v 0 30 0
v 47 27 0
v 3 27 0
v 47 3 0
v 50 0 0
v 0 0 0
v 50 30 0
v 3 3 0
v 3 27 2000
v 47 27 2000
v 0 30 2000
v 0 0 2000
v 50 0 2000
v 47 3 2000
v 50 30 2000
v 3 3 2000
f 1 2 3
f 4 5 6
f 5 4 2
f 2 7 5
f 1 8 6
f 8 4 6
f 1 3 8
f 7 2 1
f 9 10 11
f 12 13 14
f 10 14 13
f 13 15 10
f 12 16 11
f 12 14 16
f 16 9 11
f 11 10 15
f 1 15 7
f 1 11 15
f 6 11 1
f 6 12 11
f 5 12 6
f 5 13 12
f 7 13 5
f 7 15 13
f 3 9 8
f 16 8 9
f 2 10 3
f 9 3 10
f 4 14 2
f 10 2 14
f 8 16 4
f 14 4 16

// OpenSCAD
/*
square pipe
   a
 ###
 # #  b  
 ### 
 material_thickness = c
*/

module simple_profile_SP(a,b,c, length) {
    linear_extrude( height = length ) {
        polygon(
            points = [
                [0,0],
                [a,0],
                [a,b],
                [0,b],
        
                [c,c],
                [a-c,c],
                [a-c,b-c],
                [c,b-c]
            ],
            paths = [
                [0,1,2,3],
                [4,5,6,7]
            ]
        );
    }
}

simple_profile_SP(50,30,3, 2000);
